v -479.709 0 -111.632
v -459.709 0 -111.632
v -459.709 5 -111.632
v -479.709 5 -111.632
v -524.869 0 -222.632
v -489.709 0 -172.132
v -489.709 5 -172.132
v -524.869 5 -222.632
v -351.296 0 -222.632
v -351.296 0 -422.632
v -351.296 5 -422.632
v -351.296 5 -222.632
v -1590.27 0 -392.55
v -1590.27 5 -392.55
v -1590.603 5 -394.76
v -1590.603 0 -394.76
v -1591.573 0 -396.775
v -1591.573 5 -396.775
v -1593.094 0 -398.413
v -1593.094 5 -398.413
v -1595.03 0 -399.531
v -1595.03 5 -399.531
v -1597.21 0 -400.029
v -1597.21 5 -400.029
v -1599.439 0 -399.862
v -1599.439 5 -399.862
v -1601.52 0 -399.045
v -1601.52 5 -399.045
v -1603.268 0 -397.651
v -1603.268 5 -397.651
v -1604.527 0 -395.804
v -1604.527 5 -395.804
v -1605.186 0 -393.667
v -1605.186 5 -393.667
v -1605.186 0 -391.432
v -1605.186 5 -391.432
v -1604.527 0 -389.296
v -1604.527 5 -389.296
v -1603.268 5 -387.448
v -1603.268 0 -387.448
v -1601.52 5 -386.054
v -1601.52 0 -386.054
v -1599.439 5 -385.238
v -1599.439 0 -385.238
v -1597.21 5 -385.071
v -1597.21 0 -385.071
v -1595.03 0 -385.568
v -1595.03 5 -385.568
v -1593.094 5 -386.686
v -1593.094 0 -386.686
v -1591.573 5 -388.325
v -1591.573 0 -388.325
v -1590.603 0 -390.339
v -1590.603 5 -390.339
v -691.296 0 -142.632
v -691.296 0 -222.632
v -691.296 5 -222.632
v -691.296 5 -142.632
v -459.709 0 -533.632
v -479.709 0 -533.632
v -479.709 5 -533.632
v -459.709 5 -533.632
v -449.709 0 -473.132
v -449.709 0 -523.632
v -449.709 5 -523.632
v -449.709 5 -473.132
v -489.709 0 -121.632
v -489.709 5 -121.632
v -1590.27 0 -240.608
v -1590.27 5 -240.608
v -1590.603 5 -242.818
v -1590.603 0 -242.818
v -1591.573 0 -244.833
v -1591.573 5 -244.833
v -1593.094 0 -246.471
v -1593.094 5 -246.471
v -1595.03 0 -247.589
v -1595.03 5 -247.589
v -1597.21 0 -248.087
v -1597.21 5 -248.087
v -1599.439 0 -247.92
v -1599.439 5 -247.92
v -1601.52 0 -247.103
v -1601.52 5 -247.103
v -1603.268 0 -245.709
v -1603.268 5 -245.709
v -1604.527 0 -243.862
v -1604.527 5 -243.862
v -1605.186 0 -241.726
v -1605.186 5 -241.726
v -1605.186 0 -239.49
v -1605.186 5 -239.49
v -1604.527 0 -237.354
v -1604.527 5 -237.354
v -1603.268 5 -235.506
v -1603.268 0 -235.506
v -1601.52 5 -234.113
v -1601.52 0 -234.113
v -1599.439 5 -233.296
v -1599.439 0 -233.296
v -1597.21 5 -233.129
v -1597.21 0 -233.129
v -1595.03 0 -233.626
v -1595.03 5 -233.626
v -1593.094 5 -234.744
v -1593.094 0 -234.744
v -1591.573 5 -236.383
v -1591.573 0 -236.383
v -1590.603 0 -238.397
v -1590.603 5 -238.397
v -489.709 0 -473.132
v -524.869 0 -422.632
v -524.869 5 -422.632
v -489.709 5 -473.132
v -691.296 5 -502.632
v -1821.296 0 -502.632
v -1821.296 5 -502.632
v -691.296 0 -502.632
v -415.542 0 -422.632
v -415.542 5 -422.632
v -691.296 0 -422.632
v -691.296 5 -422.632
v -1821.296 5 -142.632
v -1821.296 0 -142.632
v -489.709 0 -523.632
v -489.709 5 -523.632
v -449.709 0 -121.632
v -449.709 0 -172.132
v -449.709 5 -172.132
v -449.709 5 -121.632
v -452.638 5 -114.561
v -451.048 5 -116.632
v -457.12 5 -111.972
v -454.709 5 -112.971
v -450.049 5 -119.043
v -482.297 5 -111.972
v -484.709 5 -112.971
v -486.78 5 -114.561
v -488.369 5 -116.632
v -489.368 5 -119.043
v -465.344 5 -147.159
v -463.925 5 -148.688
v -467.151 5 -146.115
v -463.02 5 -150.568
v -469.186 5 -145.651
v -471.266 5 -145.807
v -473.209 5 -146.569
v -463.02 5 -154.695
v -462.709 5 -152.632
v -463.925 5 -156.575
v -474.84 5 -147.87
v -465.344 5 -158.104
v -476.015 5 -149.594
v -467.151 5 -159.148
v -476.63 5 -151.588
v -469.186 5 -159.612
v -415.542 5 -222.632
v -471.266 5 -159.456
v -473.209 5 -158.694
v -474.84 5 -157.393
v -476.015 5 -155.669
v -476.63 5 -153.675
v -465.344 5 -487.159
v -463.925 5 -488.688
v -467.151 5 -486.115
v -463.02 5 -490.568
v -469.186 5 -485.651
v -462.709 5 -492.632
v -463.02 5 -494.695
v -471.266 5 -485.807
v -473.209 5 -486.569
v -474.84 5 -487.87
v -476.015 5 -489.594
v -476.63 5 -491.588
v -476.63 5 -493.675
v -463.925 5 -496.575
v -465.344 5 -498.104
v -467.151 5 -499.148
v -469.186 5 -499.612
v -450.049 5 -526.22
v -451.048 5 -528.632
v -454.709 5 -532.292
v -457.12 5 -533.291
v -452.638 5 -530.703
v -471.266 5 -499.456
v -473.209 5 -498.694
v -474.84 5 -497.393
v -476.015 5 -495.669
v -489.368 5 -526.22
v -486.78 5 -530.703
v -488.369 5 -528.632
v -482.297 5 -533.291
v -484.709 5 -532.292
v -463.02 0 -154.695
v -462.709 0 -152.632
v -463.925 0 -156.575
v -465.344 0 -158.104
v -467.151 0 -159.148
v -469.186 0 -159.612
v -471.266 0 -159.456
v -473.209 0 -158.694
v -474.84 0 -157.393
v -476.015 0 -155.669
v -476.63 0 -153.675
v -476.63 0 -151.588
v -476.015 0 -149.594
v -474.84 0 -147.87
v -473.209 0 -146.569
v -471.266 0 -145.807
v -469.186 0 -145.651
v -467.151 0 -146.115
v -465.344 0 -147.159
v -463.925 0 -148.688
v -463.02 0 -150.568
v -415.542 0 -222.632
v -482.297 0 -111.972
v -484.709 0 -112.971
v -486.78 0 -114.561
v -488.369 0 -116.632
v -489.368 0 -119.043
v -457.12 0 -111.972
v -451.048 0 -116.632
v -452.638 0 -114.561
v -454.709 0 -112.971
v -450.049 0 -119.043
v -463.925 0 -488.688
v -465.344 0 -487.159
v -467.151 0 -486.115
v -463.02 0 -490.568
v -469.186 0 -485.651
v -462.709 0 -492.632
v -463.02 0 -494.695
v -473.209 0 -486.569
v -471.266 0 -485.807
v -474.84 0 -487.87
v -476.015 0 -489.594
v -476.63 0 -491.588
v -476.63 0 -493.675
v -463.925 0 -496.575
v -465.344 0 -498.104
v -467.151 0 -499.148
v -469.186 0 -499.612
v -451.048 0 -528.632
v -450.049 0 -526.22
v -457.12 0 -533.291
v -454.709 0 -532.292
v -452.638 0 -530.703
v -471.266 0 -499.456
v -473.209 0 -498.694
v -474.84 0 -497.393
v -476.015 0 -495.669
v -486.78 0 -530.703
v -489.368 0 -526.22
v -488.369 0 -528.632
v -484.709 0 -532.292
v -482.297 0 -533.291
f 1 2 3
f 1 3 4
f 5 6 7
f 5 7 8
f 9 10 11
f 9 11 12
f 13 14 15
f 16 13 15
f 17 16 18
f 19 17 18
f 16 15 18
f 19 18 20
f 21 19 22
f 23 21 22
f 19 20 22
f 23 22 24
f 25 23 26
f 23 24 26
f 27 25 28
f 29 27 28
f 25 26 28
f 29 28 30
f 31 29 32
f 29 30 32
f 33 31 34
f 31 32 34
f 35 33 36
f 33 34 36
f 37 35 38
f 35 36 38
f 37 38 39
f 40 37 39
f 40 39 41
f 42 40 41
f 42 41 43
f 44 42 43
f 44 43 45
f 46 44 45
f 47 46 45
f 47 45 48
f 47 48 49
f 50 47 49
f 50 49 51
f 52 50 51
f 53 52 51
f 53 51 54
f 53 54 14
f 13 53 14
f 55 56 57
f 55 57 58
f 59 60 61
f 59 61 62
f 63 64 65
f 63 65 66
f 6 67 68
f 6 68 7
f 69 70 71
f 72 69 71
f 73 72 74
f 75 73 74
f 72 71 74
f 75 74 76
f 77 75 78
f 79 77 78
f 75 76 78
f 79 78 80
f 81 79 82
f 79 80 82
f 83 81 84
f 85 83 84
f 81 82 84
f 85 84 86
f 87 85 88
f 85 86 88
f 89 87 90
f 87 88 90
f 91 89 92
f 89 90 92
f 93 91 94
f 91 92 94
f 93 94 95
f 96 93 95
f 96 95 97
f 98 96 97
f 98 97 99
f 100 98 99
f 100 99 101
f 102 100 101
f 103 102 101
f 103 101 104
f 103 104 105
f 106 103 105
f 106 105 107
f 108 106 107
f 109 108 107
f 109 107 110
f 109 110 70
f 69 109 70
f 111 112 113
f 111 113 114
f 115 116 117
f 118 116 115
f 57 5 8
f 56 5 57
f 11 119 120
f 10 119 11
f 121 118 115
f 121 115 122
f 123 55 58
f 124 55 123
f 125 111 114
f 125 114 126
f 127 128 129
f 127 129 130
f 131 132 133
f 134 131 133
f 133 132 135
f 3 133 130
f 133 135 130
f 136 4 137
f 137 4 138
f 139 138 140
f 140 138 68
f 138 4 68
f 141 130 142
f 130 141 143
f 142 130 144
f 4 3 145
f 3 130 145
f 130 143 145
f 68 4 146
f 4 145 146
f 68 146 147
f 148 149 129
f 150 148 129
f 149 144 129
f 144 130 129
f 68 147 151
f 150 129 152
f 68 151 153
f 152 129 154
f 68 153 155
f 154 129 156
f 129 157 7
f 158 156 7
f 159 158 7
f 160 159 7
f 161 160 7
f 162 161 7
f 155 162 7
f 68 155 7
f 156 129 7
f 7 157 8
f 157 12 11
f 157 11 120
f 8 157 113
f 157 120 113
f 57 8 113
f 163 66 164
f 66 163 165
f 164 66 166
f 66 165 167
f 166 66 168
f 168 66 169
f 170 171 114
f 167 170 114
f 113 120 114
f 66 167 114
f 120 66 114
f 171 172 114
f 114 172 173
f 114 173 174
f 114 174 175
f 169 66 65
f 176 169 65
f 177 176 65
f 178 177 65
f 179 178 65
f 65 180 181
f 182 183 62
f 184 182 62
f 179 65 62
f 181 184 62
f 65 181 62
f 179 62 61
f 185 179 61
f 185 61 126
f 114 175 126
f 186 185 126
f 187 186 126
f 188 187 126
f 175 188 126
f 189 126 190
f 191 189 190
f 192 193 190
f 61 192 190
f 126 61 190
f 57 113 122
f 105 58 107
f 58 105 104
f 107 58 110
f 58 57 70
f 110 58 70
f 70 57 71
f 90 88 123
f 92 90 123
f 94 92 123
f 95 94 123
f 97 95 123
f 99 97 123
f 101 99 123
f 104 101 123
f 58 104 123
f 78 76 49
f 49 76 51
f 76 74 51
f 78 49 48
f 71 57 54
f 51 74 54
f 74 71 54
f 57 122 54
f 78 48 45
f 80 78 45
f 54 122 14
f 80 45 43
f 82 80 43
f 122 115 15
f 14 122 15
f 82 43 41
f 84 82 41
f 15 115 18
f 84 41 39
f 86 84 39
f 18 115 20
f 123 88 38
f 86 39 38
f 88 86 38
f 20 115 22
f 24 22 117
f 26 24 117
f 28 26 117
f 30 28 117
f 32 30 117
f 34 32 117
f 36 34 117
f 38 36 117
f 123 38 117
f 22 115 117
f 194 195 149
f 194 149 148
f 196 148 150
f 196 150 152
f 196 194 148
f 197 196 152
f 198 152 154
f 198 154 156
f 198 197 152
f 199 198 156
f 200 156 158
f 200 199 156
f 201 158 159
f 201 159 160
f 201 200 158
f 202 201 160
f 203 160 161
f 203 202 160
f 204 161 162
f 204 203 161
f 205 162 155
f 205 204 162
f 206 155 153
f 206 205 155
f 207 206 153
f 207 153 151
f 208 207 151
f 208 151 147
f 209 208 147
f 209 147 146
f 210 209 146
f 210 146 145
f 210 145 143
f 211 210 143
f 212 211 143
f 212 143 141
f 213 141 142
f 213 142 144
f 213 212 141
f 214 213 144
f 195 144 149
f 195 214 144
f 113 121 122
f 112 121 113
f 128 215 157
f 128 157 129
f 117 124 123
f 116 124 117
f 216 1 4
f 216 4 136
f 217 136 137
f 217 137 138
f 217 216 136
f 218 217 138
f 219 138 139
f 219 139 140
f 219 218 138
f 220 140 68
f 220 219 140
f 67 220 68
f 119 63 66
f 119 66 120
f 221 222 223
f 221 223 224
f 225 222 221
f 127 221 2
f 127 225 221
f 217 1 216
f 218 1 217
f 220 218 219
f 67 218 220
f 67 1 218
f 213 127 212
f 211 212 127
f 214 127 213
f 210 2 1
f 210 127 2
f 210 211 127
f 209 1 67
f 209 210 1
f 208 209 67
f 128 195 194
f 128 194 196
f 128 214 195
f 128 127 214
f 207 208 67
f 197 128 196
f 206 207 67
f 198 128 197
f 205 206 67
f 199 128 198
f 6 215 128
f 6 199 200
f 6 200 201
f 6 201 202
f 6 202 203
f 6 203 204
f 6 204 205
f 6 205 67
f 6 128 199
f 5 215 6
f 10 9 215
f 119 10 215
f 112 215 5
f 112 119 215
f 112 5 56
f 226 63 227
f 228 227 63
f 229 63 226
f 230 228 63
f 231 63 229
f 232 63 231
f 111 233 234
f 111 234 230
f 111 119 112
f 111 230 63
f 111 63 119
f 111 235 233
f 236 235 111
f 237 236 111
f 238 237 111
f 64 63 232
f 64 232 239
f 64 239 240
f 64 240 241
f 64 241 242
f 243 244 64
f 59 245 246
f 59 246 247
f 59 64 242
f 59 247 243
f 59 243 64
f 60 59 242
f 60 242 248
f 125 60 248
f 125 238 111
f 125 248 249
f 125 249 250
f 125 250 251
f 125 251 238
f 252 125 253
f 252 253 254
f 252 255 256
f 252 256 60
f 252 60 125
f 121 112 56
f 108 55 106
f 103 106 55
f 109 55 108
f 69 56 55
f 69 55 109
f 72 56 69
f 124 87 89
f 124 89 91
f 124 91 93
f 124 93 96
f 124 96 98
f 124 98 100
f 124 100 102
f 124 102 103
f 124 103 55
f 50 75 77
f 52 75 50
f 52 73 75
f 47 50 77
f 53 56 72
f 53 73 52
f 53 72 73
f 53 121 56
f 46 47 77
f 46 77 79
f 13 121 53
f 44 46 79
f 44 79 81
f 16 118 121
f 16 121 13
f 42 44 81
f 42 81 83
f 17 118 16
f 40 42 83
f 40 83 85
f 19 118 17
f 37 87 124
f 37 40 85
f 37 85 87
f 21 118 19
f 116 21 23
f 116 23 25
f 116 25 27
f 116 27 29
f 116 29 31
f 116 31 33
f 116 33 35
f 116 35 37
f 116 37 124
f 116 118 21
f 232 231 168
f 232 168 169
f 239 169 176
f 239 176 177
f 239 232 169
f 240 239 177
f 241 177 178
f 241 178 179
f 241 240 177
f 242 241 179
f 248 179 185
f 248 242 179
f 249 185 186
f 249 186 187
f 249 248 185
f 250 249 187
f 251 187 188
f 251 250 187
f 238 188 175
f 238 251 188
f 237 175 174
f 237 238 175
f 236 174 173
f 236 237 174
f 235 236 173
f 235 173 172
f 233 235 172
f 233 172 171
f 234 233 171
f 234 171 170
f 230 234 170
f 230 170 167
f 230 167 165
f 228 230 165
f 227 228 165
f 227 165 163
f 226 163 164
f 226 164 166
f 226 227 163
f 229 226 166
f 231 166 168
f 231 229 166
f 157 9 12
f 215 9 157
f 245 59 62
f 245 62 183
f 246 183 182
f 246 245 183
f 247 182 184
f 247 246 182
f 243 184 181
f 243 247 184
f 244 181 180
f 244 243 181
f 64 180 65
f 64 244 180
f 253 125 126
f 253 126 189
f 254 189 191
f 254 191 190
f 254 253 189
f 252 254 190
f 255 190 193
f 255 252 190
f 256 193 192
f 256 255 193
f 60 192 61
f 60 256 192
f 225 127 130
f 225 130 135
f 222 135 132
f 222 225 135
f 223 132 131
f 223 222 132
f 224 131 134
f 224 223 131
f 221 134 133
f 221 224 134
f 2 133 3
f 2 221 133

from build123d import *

# Parameters (mm, degrees)
SKETCH1_R           = 7
BOSS_EXTRUDE1_DEPTH = 5
SKETCH2_R           = 7.5
CUT_EXTRUDE1_DEPTH  = 10


with BuildPart() as part:
    # Sketch1 → Boss-Extrude1 (new body)
    with BuildSketch(Plane(origin=(0, 0, 0), x_dir=(1, 0, 0), z_dir=(0, 1, 0))):
        with BuildLine():
            Line((-415.542365302, 422.631578947), (-351.296475424, 422.631578947))
            Line((-351.296475424, 422.631578947), (-351.296475424, 222.631578947))
            Line((-351.296475424, 222.631578947), (-415.542365302, 222.631578947))
            Line((-415.542365302, 222.631578947), (-449.708642176, 172.131578947))
            Line((-449.708642176, 172.131578947), (-449.708642176, 121.631578947))
            ThreePointArc((-449.708642176, 121.631578947), (-452.637574364, 114.560511136), (-459.708642176, 111.631578947))
            Line((-459.708642176, 111.631578947), (-479.708642176, 111.631578947))
            ThreePointArc((-479.708642176, 111.631578947), (-486.779709988, 114.560511136), (-489.708642176, 121.631578947))
            Line((-489.708642176, 121.631578947), (-489.708642176, 172.131578947))
            Line((-489.708642176, 172.131578947), (-524.868977384, 222.631578947))
            Line((-524.868977384, 222.631578947), (-691.296475424, 222.631578947))
            Line((-691.296475424, 222.631578947), (-691.296475424, 142.631578947))
            Line((-691.296475424, 142.631578947), (-1821.296475424, 142.631578947))
            Line((-1821.296475424, 142.631578947), (-1821.296475424, 502.631578947))
            Line((-1821.296475424, 502.631578947), (-691.296475424, 502.631578947))
            Line((-691.296475424, 502.631578947), (-691.296475424, 422.631578947))
            Line((-691.296475424, 422.631578947), (-524.868977384, 422.631578947))
            Line((-524.868977384, 422.631578947), (-489.708642176, 473.131578947))
            Line((-489.708642176, 473.131578947), (-489.708642176, 523.631578947))
            ThreePointArc((-489.708642176, 523.631578947), (-486.779709988, 530.702646759), (-479.708642176, 533.631578947))
            Line((-479.708642176, 533.631578947), (-459.708642176, 533.631578947))
            ThreePointArc((-459.708642176, 533.631578947), (-452.637574364, 530.702646759), (-449.708642176, 523.631578947))
            Line((-449.708642176, 523.631578947), (-449.708642176, 473.131578947))
            Line((-449.708642176, 473.131578947), (-415.542365302, 422.631578947))
        make_face()
        with Locations((-469.708642176, 492.631578947)):
            Circle(SKETCH1_R, mode=Mode.SUBTRACT)
        with Locations((-469.708642176, 152.631578947)):
            Circle(SKETCH1_R, mode=Mode.SUBTRACT)
    extrude(amount=BOSS_EXTRUDE1_DEPTH)

    # Sketch2 → Cut-Extrude1 (cut)
    with BuildSketch(Plane(origin=(0, 5, 0), x_dir=(1, 0, 0), z_dir=(0, 1, 0))):
        with Locations((-1597.770206395, 392.549644623)):
            Circle(SKETCH2_R)
        with Locations((-1597.770206395, 240.60770245)):
            Circle(SKETCH2_R)
    extrude(amount=-CUT_EXTRUDE1_DEPTH, mode=Mode.SUBTRACT)


solid = part.part
